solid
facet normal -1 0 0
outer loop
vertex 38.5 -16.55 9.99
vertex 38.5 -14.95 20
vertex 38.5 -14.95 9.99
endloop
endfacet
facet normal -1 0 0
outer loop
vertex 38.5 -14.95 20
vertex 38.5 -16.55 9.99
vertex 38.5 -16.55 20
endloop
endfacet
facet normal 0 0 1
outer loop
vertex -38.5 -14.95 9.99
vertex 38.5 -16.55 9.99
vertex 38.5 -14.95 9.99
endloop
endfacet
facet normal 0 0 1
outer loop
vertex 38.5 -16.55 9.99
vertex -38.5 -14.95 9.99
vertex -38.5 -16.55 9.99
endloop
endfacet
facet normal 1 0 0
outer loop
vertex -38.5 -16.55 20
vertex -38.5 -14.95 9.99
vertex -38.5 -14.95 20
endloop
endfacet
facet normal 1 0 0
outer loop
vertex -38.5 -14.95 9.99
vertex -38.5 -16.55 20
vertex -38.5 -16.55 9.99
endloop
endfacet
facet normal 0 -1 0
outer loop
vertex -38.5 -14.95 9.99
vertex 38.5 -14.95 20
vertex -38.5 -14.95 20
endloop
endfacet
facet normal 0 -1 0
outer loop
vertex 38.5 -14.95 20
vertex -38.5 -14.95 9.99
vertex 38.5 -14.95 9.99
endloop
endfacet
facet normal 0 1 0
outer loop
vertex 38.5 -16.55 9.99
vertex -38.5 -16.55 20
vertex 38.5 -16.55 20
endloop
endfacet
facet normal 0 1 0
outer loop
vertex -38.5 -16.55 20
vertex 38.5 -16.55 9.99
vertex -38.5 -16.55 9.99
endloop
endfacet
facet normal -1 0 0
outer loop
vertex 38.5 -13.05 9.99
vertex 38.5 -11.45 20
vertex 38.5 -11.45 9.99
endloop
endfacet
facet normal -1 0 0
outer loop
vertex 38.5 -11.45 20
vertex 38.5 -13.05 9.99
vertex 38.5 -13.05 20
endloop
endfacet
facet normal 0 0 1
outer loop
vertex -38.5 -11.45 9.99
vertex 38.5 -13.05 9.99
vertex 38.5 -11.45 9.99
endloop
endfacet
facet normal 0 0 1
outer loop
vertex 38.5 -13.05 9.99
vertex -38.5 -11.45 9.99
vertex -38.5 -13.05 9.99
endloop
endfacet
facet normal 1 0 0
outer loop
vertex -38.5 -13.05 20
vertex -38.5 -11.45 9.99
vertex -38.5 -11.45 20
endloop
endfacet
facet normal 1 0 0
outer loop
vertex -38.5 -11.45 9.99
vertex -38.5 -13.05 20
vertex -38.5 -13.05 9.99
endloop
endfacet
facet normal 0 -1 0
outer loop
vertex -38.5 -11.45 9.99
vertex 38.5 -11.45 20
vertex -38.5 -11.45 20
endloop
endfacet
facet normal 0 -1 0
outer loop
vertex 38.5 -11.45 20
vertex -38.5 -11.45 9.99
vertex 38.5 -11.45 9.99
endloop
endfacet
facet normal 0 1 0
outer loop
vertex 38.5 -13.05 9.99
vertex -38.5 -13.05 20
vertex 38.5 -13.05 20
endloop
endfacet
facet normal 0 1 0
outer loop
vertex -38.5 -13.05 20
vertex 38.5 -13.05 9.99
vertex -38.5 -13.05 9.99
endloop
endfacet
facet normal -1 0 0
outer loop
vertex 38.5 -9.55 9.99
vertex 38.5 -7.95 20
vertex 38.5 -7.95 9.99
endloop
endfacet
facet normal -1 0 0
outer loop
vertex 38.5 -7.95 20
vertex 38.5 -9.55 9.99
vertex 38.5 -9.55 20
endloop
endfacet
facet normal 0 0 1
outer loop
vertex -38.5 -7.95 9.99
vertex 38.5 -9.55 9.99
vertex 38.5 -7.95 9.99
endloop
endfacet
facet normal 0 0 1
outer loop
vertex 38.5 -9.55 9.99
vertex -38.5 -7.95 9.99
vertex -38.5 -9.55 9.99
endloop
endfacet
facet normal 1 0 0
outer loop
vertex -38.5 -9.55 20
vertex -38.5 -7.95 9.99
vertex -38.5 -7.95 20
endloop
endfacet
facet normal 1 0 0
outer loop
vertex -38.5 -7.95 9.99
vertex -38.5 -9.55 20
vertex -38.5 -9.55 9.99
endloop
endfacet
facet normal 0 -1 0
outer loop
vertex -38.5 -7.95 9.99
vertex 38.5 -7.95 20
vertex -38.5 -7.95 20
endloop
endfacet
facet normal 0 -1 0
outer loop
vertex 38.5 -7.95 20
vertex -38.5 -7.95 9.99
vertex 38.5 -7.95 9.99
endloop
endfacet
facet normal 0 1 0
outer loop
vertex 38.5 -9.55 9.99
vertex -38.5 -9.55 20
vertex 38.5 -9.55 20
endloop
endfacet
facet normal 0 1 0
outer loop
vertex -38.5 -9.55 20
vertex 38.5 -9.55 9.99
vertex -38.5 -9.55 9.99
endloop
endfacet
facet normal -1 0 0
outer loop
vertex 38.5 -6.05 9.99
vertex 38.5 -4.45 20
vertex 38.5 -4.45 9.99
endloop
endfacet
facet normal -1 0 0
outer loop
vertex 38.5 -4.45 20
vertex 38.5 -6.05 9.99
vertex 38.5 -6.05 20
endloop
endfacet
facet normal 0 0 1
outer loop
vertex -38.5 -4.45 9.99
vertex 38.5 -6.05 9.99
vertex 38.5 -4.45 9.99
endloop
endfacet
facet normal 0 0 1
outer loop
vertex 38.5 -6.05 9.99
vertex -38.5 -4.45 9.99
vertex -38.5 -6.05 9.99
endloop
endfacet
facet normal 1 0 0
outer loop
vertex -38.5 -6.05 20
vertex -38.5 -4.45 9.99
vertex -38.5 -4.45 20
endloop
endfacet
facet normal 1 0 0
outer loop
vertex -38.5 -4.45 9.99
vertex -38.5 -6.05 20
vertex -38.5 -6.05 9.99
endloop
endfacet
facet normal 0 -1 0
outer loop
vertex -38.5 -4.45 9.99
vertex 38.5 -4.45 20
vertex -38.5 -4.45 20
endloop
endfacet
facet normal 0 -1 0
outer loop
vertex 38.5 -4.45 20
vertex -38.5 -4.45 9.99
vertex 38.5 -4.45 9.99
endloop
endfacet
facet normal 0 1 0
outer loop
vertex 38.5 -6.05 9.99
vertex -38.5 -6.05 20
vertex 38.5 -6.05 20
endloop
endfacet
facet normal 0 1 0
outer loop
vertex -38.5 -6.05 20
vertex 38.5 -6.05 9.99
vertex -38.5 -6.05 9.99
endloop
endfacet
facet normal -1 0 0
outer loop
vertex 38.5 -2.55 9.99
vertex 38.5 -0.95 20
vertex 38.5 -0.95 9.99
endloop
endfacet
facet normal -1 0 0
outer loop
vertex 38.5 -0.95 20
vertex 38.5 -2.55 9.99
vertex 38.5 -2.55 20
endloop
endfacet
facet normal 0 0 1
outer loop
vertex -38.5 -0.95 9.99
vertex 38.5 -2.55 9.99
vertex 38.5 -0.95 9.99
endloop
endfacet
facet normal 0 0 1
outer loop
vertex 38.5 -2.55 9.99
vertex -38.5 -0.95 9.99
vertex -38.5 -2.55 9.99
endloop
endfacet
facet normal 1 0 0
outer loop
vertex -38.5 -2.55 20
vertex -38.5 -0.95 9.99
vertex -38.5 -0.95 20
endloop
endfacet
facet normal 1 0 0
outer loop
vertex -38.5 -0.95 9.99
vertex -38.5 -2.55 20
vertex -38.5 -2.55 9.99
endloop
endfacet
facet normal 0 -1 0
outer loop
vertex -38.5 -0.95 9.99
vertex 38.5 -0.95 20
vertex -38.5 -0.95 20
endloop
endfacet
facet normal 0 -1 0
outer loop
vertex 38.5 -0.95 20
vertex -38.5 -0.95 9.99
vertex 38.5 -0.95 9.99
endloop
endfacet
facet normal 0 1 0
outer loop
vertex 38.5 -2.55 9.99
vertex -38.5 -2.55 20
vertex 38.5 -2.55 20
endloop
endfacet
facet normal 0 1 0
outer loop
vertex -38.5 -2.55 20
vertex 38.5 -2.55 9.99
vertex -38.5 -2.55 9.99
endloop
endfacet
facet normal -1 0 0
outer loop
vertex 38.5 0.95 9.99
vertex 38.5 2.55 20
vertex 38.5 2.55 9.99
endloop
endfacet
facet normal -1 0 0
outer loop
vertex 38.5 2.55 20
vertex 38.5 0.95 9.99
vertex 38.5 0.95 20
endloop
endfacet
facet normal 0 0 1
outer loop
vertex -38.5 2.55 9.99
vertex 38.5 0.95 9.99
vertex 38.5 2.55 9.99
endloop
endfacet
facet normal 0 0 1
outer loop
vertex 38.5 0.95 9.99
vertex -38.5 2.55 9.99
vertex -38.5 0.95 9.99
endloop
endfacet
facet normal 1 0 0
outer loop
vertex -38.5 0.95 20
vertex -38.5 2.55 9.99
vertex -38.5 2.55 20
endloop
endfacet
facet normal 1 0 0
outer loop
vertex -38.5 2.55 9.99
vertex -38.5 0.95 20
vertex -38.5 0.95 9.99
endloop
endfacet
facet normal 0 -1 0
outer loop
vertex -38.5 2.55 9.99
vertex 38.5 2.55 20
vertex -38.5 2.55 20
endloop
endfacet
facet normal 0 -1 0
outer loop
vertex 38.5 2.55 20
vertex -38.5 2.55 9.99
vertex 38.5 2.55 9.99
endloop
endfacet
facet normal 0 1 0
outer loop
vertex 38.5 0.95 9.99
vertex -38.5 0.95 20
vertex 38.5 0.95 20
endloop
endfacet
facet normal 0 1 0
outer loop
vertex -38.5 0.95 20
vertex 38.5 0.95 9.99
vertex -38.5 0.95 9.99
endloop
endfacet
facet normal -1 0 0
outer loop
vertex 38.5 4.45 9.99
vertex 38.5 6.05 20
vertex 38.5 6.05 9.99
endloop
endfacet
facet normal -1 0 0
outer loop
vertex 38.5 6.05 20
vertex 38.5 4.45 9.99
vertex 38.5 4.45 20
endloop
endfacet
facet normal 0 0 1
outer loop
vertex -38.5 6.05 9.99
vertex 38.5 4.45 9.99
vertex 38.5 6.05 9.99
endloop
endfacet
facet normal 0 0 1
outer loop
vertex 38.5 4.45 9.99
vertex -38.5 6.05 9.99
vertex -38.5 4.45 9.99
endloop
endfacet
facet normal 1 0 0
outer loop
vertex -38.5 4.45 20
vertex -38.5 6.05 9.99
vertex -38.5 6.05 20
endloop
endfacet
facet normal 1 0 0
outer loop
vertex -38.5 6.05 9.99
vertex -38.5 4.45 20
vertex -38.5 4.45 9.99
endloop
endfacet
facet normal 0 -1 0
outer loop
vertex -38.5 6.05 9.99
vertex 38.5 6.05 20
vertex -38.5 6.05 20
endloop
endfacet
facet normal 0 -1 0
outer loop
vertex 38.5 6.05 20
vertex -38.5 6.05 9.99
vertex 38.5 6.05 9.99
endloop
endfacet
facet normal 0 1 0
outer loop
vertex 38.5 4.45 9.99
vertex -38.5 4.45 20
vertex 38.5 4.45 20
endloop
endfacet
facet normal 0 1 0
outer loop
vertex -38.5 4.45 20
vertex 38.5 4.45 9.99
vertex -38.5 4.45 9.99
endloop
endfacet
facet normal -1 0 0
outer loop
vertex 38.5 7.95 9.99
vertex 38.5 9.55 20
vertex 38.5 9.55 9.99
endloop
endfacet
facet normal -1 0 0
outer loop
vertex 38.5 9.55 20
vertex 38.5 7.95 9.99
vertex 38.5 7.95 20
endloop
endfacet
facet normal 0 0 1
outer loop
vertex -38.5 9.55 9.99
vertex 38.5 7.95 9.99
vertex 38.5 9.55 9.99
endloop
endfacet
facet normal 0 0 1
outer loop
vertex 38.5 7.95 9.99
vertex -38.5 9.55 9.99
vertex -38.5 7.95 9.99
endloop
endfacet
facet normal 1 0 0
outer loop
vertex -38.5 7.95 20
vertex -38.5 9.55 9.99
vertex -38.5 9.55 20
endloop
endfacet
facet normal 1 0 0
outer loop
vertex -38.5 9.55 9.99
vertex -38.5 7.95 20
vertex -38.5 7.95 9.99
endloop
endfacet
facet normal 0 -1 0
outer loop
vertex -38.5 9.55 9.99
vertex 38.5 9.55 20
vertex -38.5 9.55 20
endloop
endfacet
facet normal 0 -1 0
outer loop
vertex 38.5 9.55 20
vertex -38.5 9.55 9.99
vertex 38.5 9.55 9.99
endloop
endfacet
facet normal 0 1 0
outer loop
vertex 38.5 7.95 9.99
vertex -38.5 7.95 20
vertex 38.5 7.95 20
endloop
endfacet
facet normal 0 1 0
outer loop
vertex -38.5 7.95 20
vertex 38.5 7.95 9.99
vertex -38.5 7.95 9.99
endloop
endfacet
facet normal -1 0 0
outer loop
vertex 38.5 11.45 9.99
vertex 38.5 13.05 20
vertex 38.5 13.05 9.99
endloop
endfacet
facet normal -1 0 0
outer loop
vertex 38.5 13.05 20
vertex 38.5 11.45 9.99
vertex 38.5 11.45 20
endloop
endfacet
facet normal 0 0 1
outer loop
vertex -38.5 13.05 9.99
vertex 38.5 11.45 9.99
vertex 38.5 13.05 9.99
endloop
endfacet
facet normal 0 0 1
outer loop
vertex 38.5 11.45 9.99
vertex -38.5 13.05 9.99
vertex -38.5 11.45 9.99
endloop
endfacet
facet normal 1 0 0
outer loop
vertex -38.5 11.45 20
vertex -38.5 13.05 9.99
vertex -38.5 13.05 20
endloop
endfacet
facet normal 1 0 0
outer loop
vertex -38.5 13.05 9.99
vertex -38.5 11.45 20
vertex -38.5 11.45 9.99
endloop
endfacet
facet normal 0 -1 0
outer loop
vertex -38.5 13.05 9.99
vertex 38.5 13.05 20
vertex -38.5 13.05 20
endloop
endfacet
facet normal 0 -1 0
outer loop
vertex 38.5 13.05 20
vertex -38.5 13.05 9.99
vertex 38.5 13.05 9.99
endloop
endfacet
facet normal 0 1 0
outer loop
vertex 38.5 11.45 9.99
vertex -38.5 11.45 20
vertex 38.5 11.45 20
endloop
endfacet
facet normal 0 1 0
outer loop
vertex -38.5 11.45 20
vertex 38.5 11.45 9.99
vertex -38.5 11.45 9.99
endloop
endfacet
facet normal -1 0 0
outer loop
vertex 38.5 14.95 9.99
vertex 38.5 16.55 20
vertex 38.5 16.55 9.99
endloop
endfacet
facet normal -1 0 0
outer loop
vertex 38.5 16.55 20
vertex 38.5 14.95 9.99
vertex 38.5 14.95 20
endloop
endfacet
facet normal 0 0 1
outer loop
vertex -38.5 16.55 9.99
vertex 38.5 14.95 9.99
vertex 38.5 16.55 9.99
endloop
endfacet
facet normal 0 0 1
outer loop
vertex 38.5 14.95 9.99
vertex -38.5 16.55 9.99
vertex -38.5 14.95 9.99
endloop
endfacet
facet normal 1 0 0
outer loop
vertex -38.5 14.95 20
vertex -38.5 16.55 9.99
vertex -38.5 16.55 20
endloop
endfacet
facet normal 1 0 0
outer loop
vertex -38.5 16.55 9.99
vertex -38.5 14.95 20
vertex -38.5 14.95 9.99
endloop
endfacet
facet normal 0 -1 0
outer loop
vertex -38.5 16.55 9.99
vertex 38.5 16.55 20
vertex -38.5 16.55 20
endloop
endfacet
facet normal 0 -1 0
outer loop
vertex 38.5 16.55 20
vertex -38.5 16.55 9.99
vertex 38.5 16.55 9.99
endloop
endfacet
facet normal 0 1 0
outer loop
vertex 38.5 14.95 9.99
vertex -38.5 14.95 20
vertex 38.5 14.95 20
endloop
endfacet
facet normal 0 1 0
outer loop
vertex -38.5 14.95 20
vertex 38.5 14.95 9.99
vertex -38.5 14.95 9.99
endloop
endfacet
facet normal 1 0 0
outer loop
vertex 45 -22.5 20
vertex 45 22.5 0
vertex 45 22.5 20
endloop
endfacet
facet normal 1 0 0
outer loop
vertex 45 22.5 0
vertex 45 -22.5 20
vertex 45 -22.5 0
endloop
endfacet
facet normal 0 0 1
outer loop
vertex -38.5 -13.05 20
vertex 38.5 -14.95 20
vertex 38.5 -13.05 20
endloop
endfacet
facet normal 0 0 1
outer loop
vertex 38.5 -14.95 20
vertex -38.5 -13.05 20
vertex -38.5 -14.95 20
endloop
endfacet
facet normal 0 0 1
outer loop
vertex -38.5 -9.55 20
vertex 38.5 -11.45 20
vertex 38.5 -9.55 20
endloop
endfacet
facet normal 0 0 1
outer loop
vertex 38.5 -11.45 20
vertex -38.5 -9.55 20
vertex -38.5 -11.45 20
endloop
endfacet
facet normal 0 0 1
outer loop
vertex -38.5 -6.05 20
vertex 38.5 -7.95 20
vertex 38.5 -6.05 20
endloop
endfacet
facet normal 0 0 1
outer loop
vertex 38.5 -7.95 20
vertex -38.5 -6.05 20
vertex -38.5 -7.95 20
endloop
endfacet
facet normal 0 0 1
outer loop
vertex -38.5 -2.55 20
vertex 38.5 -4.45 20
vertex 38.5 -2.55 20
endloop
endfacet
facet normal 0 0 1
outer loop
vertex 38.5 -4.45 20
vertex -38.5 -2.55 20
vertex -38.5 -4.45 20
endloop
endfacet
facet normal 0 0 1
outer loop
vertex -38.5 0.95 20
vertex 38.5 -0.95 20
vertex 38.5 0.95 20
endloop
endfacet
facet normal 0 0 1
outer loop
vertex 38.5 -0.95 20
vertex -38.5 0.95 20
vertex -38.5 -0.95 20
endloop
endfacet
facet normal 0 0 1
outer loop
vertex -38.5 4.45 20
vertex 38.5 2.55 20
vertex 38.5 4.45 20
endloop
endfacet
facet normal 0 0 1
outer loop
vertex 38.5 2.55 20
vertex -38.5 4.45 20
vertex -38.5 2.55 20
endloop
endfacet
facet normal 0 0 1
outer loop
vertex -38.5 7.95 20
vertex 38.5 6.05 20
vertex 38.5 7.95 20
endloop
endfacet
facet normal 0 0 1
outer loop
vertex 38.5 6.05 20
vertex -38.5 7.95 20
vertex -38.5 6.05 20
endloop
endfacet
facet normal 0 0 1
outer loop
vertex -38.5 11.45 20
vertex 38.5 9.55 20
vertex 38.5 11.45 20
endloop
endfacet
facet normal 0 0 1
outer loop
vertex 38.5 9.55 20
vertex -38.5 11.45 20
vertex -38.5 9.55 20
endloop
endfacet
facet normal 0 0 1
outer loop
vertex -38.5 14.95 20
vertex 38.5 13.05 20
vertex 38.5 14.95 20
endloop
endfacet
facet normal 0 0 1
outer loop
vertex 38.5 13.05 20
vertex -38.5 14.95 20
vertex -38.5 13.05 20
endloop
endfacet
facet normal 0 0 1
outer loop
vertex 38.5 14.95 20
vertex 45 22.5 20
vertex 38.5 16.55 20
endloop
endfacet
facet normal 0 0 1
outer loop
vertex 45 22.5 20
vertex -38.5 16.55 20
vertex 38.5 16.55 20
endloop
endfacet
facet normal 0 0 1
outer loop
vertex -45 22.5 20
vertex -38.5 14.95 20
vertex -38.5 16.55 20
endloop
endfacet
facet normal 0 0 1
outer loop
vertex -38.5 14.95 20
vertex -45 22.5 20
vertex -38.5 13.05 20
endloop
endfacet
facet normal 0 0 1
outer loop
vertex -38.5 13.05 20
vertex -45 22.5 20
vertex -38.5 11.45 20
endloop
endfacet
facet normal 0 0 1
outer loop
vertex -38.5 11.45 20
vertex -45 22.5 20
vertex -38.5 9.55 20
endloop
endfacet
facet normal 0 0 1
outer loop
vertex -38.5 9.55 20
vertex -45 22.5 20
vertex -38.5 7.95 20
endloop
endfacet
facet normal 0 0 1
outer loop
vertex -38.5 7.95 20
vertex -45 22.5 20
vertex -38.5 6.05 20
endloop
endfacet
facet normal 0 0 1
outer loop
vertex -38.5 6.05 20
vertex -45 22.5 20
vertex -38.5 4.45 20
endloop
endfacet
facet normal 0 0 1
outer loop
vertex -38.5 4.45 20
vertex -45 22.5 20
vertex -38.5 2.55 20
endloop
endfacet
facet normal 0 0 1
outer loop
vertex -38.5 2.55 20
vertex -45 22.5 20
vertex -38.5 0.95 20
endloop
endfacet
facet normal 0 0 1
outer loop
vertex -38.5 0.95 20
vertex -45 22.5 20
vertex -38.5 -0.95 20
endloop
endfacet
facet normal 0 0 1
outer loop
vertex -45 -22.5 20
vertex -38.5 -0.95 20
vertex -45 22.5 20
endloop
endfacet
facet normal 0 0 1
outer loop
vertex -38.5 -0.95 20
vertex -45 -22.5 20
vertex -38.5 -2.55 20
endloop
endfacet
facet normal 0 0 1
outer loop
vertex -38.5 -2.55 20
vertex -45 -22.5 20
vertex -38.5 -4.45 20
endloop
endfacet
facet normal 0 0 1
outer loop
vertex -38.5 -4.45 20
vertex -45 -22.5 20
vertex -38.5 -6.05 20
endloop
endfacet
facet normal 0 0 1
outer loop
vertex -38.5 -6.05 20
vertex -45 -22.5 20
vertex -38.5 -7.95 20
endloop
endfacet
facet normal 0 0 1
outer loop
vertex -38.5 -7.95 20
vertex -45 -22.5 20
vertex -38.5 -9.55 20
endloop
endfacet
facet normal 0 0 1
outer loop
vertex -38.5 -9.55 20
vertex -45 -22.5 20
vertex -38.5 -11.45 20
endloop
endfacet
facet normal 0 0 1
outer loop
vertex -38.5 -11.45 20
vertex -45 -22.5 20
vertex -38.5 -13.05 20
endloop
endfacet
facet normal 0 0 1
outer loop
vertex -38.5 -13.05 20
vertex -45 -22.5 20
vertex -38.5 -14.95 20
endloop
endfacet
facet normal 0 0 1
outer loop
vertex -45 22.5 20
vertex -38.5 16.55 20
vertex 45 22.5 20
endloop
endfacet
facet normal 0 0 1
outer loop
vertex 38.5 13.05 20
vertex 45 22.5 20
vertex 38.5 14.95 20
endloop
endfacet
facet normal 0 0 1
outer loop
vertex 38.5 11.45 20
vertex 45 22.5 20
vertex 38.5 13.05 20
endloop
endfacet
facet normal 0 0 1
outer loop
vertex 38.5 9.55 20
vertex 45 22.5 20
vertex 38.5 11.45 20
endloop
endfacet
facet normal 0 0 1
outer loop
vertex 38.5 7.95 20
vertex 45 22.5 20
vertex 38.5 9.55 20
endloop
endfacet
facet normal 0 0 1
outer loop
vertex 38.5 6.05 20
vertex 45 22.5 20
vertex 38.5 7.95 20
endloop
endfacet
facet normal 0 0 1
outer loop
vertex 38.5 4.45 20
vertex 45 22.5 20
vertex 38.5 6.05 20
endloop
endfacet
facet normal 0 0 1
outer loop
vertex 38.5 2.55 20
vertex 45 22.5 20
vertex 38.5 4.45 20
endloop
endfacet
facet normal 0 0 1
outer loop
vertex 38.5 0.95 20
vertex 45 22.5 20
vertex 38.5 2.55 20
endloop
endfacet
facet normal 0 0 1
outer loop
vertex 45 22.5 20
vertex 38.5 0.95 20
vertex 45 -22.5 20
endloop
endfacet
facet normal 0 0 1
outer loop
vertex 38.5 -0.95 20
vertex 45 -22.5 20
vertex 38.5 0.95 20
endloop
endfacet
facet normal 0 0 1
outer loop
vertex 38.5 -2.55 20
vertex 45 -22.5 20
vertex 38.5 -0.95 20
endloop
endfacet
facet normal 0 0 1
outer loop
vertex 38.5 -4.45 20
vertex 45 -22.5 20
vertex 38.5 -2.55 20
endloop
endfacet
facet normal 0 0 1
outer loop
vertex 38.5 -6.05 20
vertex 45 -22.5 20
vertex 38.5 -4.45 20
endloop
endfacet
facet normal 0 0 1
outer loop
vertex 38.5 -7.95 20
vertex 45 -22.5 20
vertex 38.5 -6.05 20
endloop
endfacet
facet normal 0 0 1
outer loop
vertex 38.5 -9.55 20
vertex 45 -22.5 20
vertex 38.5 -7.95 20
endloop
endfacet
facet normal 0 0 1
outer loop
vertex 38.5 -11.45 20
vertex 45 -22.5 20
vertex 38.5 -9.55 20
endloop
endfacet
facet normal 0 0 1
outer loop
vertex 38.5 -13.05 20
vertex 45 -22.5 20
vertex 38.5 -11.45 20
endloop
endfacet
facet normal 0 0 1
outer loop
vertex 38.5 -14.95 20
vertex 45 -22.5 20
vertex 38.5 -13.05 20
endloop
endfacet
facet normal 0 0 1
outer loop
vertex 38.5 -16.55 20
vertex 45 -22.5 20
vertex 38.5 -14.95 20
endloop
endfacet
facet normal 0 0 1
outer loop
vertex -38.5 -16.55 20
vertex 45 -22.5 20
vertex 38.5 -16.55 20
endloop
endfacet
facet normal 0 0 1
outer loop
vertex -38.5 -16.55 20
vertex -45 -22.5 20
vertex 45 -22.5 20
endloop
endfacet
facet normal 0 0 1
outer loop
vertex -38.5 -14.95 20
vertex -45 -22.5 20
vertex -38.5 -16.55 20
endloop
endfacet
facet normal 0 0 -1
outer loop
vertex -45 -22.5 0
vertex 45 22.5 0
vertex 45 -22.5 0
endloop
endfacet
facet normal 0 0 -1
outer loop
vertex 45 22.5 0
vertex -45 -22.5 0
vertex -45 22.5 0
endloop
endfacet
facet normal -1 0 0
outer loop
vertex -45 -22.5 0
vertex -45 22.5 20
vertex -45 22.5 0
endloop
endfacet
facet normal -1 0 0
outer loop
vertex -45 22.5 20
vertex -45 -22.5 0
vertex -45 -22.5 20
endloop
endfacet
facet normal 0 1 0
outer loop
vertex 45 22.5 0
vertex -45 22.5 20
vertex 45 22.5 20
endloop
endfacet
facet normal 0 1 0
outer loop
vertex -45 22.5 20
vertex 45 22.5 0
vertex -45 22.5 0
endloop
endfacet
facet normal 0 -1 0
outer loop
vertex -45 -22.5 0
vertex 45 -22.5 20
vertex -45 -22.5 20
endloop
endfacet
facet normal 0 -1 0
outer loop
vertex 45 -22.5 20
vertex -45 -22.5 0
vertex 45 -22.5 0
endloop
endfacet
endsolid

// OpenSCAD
// Drying Rack for 10 Microscope Slides
// Dimensions measured with calipers

// Base block dimensions
base_length = 90;   // mm (X)
base_width = 45;    // mm (Y)
base_height = 20;   // mm (Z)

// Slot dimensions
slot_length = 77;   // mm (X)
slot_width = 1.6;   // mm (Y)
slot_depth = 10;    // mm (Z)

// Slot arrangement
num_slots = 10;
slot_spacing = 3.5; // mm centre-to-centre (Y)

// Rendering quality
$fn = 64;

// Calculate total width of the slot group
total_slot_group_width = (num_slots - 1) * slot_spacing;

// Calculate starting Y position to centre the group on the block
// The centre of the group is at Y=0.
// The first slot centre is at -total_slot_group_width/2
start_y = -total_slot_group_width / 2;

// Build the base block
difference() {
    // Main solid block
    translate([-base_length/2, -base_width/2, 0])
        cube([base_length, base_width, base_height]);

    // Cut out the slots
    for (i = [0 : num_slots - 1]) {
        y_pos = start_y + i * slot_spacing;
        
        // Slot cutter: extends slightly past the base in X and Z to ensure clean cut
        // Centered in X at 0, centered in Y at y_pos
        // Z starts from top (base_height) and goes down by slot_depth
        // We extend 0.01mm deeper to ensure no coplanar faces
        translate([-slot_length/2, y_pos - slot_width/2, base_height - slot_depth - 0.01])
            cube([slot_length, slot_width, slot_depth + 0.02]);
    }
}
